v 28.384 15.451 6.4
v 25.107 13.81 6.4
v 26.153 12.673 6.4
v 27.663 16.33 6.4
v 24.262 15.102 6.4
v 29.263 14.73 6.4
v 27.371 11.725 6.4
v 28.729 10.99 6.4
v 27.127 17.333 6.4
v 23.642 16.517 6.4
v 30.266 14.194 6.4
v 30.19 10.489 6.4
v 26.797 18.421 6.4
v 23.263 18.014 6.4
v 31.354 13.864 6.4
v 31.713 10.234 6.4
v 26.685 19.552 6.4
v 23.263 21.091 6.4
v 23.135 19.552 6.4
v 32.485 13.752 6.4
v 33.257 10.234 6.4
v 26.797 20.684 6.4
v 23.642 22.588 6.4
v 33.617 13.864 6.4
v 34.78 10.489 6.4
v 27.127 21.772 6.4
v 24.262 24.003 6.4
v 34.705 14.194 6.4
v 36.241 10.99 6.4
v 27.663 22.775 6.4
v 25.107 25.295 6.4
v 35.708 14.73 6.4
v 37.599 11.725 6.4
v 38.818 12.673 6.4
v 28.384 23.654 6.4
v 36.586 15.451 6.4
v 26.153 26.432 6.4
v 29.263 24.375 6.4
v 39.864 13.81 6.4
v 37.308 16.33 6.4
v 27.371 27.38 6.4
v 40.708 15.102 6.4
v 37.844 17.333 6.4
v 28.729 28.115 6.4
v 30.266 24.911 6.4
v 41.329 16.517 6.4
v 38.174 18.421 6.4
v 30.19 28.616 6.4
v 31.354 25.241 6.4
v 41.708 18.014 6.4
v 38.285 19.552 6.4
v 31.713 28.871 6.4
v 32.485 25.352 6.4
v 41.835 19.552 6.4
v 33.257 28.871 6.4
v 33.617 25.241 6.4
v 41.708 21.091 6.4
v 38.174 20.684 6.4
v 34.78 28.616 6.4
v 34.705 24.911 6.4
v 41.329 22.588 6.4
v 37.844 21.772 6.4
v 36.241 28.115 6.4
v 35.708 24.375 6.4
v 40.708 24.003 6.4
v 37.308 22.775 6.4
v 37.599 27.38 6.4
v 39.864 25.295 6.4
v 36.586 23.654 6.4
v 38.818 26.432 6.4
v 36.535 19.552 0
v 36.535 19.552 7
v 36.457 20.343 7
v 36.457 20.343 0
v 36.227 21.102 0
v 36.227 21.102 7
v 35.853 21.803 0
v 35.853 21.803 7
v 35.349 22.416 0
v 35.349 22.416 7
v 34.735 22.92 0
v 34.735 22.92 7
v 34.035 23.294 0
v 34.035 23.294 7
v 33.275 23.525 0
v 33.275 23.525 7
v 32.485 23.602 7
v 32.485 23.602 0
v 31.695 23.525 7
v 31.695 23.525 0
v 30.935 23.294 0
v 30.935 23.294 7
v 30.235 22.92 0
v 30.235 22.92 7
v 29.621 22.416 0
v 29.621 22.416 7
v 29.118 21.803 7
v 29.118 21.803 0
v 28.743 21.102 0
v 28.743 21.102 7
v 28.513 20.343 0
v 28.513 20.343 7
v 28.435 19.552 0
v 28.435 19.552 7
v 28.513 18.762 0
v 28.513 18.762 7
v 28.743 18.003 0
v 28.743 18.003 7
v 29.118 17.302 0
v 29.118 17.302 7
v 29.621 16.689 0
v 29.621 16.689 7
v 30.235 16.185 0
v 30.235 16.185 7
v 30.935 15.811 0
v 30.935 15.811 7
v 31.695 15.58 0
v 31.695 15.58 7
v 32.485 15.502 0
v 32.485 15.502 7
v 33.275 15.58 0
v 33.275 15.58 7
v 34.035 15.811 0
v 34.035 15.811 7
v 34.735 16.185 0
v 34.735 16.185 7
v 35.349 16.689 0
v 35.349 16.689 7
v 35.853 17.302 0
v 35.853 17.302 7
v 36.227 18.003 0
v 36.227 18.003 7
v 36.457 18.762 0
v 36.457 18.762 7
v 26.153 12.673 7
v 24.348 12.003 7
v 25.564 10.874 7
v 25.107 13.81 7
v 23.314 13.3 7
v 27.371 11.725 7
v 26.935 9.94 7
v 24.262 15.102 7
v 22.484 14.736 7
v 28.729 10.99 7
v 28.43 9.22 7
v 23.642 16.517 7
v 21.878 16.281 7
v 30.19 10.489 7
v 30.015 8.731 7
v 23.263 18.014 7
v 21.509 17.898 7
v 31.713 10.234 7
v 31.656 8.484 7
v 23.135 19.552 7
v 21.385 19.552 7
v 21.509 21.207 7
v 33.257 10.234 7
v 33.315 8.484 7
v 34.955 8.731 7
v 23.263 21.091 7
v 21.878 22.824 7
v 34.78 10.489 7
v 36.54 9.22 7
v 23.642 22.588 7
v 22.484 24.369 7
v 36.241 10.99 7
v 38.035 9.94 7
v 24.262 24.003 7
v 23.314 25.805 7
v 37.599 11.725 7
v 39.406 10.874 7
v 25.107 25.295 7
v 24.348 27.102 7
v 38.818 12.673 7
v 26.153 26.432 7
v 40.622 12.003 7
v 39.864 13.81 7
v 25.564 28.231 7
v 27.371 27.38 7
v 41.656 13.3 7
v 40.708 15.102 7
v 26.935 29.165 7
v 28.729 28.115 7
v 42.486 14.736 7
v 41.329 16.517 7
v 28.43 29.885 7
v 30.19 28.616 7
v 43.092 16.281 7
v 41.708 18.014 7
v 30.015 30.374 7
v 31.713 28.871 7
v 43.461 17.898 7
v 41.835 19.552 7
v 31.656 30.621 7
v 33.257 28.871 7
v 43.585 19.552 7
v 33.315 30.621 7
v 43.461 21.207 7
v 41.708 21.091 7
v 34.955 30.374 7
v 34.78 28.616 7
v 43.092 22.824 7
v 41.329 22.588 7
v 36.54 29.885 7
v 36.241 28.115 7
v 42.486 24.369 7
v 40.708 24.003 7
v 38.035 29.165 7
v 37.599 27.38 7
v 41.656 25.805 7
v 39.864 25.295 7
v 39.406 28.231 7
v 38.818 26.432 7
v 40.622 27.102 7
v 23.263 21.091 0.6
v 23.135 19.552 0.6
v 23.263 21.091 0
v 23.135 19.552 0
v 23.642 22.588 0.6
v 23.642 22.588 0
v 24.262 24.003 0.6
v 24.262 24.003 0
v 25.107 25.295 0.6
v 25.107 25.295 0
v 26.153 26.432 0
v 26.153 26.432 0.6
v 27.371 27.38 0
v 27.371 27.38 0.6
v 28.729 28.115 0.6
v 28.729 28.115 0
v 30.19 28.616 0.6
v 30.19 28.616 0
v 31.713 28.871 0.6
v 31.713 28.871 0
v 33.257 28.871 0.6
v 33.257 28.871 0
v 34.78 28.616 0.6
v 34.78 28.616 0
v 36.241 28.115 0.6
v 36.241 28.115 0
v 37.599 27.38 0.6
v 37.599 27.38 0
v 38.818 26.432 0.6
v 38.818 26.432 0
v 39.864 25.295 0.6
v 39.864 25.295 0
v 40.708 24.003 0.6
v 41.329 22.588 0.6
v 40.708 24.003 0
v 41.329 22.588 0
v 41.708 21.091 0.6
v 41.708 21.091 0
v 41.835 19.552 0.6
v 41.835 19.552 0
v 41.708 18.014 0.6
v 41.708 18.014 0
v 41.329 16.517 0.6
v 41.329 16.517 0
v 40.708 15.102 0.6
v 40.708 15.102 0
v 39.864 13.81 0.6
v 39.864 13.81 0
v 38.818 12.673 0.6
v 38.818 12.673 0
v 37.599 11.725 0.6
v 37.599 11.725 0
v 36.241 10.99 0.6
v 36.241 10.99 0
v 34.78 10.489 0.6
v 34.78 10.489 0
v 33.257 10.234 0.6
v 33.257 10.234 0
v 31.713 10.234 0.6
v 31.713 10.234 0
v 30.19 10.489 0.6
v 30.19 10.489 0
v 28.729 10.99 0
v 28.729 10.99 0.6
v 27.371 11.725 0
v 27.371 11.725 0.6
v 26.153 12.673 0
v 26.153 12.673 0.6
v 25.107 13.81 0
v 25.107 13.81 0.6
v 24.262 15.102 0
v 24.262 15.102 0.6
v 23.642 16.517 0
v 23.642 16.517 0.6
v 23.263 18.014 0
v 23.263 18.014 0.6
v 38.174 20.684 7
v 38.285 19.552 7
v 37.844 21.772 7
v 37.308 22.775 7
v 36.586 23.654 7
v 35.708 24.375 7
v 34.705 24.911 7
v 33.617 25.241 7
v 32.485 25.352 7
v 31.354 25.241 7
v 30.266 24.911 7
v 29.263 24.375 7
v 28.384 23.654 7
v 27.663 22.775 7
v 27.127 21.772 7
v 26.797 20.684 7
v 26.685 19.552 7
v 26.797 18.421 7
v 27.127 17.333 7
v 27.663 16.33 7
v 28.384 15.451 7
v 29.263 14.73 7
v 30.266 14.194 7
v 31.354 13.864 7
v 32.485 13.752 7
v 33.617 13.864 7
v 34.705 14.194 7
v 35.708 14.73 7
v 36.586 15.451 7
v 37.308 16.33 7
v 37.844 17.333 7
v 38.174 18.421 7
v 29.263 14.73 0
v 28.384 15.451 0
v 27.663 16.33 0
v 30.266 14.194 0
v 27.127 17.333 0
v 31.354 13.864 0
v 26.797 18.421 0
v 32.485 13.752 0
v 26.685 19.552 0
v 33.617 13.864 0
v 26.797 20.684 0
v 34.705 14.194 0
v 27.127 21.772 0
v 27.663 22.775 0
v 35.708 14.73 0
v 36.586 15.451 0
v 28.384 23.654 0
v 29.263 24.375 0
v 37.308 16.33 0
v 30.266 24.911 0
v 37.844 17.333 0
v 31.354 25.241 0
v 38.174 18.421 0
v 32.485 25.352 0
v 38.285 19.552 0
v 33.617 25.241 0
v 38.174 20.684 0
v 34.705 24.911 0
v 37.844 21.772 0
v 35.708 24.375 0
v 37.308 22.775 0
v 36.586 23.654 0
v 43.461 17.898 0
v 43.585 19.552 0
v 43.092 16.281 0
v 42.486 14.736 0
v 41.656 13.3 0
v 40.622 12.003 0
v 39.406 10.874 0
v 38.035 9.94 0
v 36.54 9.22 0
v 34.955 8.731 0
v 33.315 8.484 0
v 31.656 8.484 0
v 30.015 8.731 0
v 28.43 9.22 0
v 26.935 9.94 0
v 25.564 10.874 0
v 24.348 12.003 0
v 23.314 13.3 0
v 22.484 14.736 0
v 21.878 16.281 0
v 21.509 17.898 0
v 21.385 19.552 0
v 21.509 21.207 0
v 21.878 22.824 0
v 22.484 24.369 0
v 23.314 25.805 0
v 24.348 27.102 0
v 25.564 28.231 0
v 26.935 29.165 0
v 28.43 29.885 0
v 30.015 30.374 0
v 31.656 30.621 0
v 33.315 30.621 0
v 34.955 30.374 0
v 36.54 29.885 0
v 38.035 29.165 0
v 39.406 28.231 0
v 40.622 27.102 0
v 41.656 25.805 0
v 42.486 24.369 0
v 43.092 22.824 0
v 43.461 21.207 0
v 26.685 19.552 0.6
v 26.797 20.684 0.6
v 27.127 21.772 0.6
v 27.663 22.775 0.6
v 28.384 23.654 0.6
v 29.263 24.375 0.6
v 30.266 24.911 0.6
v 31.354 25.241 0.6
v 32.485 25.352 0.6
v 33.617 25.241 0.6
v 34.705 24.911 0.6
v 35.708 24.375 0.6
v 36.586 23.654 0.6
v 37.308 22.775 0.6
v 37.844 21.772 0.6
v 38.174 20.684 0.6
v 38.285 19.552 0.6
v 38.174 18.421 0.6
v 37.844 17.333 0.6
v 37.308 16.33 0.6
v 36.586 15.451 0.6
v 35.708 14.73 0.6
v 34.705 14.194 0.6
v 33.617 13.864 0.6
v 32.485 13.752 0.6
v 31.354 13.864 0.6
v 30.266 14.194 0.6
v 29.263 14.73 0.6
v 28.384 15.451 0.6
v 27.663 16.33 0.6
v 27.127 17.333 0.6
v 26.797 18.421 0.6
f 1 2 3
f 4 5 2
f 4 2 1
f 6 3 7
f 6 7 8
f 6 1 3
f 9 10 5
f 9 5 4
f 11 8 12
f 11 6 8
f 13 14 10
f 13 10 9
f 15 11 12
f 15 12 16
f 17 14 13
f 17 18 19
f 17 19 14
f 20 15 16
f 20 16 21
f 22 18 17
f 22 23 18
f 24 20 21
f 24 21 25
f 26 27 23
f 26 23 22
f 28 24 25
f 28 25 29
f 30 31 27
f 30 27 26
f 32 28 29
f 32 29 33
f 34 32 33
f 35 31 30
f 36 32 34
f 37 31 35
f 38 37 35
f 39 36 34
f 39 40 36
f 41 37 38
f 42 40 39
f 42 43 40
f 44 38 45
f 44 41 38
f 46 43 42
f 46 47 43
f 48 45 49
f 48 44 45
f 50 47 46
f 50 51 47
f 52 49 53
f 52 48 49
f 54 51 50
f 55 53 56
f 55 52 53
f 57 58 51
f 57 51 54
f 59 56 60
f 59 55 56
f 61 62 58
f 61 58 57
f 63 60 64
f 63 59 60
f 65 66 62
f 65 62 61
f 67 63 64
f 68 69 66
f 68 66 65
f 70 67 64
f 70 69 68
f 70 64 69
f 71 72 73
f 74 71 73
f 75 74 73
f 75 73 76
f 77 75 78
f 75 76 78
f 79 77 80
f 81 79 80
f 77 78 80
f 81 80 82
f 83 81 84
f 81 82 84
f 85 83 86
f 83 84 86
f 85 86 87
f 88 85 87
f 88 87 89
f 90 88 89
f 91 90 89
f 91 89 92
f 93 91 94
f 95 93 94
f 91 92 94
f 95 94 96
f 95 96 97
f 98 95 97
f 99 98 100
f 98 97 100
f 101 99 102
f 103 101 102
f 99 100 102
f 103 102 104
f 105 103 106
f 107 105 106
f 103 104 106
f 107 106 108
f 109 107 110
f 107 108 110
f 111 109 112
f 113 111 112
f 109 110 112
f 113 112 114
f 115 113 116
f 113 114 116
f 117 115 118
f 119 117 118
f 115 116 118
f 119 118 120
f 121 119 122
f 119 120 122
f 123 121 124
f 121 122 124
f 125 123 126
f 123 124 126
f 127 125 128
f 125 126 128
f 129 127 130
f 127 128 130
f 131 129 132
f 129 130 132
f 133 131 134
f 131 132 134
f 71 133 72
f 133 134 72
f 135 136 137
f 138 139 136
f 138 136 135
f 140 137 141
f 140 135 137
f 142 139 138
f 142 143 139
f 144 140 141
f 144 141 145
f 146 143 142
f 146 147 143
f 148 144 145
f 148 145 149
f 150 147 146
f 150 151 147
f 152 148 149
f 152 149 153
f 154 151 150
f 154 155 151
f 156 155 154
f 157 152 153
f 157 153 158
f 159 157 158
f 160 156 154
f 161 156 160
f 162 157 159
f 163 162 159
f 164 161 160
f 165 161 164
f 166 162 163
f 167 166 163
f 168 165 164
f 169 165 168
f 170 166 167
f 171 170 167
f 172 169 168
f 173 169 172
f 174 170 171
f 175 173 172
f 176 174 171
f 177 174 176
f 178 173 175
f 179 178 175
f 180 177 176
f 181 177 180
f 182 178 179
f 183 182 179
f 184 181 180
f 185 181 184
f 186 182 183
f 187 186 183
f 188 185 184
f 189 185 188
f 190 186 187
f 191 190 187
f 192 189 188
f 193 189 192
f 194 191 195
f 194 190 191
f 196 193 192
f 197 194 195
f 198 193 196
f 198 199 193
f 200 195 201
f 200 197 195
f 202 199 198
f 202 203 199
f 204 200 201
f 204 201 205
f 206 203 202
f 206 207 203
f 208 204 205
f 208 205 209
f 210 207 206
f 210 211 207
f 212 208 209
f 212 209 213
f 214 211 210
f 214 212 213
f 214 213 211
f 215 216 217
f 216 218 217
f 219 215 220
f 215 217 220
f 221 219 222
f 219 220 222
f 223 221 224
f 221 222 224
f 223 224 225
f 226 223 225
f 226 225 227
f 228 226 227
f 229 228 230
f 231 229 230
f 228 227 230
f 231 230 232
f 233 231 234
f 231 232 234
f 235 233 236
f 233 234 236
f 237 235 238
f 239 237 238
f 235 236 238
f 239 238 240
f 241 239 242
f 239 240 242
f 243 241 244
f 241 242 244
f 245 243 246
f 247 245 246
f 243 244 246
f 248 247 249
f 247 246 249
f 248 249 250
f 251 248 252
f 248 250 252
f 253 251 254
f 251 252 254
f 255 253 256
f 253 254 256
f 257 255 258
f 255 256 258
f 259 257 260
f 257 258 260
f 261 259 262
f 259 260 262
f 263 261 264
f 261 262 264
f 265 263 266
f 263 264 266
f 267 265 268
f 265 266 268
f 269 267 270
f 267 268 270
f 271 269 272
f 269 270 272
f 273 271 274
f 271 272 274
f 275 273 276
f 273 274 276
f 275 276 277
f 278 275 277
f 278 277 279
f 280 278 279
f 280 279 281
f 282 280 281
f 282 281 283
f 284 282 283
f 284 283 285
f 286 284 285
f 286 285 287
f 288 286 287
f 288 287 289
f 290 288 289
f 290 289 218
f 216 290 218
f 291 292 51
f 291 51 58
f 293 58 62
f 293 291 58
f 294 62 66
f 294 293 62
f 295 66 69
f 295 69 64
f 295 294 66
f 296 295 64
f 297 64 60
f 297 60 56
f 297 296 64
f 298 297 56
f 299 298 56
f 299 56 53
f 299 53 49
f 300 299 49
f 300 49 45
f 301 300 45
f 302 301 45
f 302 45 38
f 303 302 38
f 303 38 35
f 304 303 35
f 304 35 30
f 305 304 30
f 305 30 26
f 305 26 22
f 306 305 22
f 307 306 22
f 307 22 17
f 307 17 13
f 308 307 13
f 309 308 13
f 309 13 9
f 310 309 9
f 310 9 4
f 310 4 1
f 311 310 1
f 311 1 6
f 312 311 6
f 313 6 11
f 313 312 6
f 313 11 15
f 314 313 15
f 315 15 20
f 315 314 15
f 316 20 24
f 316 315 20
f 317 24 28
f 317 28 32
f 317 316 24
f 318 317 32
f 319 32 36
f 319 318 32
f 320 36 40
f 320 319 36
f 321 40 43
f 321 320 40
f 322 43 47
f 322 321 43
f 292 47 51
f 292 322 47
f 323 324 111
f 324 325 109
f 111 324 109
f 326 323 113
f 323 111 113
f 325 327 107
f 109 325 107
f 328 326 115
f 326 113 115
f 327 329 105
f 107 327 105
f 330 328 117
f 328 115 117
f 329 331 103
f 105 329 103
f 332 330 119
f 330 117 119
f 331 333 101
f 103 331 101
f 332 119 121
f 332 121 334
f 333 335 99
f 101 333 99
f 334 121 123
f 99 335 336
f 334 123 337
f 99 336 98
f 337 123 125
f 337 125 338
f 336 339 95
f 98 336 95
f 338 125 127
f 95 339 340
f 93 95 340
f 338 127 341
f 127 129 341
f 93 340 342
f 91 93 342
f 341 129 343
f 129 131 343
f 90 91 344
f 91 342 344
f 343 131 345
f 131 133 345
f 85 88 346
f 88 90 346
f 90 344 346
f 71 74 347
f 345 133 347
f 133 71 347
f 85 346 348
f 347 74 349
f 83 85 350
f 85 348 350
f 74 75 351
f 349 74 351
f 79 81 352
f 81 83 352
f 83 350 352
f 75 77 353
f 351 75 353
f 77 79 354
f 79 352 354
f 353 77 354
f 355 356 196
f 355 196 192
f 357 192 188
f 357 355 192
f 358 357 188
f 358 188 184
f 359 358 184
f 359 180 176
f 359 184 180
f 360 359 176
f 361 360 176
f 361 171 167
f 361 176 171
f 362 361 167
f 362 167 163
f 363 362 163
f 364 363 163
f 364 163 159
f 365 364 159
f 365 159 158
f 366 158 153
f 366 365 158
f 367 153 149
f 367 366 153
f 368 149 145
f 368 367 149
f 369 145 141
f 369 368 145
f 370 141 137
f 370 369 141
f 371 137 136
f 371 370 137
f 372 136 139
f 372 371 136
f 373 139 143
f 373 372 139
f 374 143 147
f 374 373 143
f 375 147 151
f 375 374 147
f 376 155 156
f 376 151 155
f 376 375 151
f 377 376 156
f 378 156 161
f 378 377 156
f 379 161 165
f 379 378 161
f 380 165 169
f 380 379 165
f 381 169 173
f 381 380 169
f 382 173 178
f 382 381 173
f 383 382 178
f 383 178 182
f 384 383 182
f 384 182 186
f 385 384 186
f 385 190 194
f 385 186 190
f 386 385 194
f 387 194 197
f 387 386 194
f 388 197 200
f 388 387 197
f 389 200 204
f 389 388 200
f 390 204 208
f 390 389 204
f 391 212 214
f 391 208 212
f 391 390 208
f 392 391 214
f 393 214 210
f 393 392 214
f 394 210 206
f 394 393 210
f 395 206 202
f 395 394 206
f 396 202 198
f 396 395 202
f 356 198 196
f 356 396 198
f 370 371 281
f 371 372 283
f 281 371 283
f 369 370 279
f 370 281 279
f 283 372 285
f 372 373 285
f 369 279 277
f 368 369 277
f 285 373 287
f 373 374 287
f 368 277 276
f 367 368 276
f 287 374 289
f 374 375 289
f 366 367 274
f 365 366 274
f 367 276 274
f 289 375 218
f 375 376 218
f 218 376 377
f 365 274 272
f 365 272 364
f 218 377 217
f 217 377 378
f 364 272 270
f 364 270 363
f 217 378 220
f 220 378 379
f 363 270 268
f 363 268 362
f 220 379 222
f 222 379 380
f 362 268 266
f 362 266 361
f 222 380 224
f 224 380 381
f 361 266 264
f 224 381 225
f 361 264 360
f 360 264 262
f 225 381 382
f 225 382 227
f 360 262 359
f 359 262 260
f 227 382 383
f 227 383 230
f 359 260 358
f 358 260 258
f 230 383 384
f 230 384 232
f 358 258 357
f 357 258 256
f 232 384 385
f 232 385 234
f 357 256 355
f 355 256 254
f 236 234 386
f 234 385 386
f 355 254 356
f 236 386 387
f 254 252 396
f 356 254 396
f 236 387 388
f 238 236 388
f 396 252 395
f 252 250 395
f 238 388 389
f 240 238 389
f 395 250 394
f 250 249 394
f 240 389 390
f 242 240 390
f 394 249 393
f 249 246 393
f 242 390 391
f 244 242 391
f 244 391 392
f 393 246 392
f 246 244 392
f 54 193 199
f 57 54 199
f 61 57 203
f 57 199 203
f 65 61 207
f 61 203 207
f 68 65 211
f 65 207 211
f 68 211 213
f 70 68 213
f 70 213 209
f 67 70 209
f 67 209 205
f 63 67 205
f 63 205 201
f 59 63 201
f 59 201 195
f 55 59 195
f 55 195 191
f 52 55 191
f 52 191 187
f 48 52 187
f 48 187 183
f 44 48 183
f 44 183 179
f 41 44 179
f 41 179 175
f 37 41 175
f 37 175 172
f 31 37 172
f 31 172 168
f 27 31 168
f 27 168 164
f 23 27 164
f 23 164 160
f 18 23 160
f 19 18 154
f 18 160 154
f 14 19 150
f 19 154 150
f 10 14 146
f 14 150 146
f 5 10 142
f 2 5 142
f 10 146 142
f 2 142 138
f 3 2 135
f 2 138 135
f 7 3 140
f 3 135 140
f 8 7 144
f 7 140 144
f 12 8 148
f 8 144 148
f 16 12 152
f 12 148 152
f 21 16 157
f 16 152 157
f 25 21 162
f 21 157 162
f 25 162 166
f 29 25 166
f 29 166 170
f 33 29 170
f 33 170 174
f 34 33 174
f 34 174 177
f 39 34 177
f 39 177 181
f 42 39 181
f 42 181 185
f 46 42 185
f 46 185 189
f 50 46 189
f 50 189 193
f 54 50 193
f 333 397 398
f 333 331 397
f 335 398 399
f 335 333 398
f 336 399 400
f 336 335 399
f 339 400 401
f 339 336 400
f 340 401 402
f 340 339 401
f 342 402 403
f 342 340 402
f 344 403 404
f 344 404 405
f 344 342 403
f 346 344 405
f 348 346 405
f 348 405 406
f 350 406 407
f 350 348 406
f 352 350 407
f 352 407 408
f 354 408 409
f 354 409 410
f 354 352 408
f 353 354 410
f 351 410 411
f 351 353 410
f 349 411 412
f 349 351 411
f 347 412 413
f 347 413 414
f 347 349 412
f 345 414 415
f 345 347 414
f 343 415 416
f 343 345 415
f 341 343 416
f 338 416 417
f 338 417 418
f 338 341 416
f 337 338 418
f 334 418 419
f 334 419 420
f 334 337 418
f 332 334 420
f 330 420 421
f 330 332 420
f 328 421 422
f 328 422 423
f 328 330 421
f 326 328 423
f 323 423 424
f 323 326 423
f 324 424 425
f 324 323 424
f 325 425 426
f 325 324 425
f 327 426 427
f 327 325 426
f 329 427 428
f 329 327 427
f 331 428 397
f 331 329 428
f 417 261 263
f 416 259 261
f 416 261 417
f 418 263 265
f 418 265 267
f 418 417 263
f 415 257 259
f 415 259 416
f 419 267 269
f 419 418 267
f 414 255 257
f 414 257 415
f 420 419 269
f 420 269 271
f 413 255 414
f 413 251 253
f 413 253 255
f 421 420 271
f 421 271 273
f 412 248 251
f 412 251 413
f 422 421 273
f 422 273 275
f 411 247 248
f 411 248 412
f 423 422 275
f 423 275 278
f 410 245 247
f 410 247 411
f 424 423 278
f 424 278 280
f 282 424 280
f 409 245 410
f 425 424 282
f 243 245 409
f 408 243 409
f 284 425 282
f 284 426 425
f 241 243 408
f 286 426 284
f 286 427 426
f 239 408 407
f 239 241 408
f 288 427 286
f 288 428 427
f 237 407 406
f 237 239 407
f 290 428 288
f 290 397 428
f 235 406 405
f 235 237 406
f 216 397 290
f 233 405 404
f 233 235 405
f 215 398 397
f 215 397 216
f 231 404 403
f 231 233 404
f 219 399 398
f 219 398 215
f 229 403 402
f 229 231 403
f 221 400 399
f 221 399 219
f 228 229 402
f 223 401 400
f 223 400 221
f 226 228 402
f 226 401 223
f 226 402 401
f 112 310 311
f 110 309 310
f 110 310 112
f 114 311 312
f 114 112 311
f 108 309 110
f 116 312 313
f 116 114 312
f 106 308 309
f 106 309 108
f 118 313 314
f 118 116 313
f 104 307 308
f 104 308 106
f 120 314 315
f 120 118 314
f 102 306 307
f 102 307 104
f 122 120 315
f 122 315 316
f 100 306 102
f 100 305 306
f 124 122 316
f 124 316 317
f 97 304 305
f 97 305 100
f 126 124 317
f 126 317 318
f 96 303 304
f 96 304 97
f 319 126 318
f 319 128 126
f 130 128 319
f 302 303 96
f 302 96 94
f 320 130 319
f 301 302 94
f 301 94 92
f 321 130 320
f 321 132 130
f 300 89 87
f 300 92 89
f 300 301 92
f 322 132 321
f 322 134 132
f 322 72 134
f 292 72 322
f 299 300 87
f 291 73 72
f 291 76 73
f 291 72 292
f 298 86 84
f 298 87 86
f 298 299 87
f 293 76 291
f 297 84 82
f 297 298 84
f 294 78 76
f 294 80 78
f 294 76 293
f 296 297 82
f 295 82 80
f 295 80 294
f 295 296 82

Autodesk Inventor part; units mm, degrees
ref_plane "YZ Plane" through (0, 0, 0) normal (1, 0, 0) x (0, 1, 0)
ref_plane "XZ Plane" through (0, 0, 0) normal (0, 1, 0) x (-1, 0, 0)
ref_plane "XY Plane" through (0, 0, 0) normal (0, 0, 1) x (1, 0, 0)
sketch "Sketch1" plane through (0, 0, 0) normal (0, 0, 1) x (1, 0, 0)
  circle A0 centre (32.4852, 19.5525) radius 11.1
  point P0 (0, 0)
extrude "Extrusion1" add sketch "Sketch1" along normal blind 7
sketch "Sketch7" plane through (32.4852, 19.5525, 7) normal (0, 0, 1) x (1, 0, 0)
  circle A0 centre (0, 0) radius 4.05
  circle A1 centre (0, 0) radius 11.1
  point P0 (-32.4852, -19.5525)
extrude "Extrusion7" cut sketch "Sketch7" against normal up to surface (7 mm away) contours A0
sketch "Sketch8" plane through (32.4852, 19.5525, 7) normal (0, 0, 1) x (1, 0, 0)
  circle A0 centre (0, 0) radius 4.05
  line L0 (4.05, 0) -> (5.8, 0)
  circle A1 centre (0, 0) radius 5.8
  circle A2 centre (0, 0) radius 11.1
  line L1 (11.1, 0) -> (9.35, 0)
  circle A3 centre (0, 0) radius 9.35
  point P0 (-32.4852, -19.5525)
  dimension "d18" = 1.75
  dimension "d19" = 1.75
extrude "Extrusion8" cut sketch "Sketch8" against normal blind 0.6 contours A3
sketch "Sketch9" plane through (32.4852, 19.5525, 0) normal (0, 0, -1) x (-1, 0, 0)
  circle A0 centre (0, 0) radius 5.8
  circle A1 centre (0, 0) radius 9.35
  point P0 (32.4852, -19.5525)
extrude "Extrusion9" cut sketch "Sketch9" against normal blind 0.6
properties part number "Metal bearing" material "Stainless Steel"
